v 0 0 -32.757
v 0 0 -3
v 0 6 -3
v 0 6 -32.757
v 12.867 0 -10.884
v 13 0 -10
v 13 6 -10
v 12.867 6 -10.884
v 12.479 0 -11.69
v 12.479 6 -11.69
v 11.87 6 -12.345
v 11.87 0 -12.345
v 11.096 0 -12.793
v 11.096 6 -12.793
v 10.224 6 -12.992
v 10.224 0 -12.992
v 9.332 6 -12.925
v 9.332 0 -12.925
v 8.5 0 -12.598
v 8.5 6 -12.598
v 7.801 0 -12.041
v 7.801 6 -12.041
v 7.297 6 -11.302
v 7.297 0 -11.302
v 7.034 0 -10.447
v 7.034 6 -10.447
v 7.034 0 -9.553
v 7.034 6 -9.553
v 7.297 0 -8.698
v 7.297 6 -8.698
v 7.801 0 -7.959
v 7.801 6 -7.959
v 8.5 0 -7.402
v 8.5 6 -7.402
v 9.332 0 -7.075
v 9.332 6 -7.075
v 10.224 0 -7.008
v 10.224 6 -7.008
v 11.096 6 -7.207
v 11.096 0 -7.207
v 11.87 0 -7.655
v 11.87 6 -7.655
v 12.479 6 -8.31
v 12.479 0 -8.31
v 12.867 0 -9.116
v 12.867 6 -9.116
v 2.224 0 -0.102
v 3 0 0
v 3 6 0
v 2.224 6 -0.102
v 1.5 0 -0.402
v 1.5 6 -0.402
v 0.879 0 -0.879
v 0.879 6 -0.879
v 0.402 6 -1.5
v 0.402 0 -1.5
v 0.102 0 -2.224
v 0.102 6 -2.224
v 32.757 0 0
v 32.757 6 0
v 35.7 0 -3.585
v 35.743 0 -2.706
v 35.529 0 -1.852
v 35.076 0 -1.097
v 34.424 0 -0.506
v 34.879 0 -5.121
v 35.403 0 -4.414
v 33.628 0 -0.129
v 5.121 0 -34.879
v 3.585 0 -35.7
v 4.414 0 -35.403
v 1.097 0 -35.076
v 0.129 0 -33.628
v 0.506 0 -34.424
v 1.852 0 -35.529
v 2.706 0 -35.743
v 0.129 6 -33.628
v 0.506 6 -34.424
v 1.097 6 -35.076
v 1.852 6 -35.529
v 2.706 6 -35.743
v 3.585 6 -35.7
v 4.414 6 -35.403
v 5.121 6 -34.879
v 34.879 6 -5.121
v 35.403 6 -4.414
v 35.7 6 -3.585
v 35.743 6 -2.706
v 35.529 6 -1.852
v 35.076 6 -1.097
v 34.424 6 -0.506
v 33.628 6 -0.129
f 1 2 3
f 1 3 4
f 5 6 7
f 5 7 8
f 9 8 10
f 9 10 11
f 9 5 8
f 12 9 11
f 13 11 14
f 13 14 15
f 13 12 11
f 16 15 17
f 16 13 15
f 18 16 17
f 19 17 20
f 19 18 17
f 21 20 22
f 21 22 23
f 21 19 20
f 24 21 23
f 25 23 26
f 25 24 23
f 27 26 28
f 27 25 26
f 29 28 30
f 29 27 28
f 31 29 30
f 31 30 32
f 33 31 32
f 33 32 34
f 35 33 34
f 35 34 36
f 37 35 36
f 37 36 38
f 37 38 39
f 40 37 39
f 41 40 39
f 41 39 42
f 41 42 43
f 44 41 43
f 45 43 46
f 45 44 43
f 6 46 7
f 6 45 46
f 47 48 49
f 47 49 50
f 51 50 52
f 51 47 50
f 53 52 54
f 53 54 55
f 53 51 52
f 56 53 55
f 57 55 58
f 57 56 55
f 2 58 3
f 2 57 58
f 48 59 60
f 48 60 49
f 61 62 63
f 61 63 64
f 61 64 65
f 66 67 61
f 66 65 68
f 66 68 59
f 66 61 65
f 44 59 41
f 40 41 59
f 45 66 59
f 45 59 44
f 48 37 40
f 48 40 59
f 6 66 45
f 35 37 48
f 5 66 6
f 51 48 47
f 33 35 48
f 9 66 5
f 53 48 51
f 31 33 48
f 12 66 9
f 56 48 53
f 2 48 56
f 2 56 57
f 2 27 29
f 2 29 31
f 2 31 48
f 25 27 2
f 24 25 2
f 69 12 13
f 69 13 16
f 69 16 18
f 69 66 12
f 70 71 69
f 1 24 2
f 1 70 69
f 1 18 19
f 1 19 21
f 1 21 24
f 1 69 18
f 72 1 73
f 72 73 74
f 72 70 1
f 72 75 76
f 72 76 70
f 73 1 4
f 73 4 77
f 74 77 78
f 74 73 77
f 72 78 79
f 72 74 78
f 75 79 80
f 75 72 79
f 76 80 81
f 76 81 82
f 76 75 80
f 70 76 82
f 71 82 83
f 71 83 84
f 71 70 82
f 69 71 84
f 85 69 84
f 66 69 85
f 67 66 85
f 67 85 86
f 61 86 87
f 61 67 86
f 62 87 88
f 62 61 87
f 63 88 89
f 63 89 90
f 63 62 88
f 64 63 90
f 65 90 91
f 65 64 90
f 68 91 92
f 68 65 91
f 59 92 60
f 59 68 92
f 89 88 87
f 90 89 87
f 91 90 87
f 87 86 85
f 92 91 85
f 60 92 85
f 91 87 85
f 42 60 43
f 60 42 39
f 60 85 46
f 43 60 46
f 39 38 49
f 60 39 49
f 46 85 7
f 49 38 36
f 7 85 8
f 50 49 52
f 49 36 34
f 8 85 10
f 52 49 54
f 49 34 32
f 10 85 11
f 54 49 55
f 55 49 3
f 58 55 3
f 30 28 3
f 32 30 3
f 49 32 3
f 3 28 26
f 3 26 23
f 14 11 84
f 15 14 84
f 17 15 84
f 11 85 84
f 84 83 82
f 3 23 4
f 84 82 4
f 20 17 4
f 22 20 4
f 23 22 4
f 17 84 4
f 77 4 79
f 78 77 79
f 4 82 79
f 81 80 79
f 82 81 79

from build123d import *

# Parameters (mm, degrees)
SKETCH1_R           = 3
BOSS_EXTRUDE1_DEPTH = 6


with BuildPart() as part:
    # Sketch1 → Boss-Extrude1 (new body)
    with BuildSketch(Plane(origin=(0, 0, 0), x_dir=(1, 0, 0), z_dir=(0, 1, 0))):
        with BuildLine():
            Line((5.121320344, 34.878679656), (34.878679656, 5.121320344))
            ThreePointArc((34.878679656, 5.121320344), (35.52899791, 1.851949703), (32.757359313, 0))
            Line((32.757359313, 0), (3, 0))
            ThreePointArc((3, 0), (0.878679656, 0.878679656), (0, 3))
            Line((0, 3), (0, 32.757359313))
            ThreePointArc((0, 32.757359313), (1.851949703, 35.52899791), (5.121320344, 34.878679656))
        make_face()
        with Locations((10, 10)):
            Circle(SKETCH1_R, mode=Mode.SUBTRACT)
    extrude(amount=BOSS_EXTRUDE1_DEPTH)


solid = part.part
